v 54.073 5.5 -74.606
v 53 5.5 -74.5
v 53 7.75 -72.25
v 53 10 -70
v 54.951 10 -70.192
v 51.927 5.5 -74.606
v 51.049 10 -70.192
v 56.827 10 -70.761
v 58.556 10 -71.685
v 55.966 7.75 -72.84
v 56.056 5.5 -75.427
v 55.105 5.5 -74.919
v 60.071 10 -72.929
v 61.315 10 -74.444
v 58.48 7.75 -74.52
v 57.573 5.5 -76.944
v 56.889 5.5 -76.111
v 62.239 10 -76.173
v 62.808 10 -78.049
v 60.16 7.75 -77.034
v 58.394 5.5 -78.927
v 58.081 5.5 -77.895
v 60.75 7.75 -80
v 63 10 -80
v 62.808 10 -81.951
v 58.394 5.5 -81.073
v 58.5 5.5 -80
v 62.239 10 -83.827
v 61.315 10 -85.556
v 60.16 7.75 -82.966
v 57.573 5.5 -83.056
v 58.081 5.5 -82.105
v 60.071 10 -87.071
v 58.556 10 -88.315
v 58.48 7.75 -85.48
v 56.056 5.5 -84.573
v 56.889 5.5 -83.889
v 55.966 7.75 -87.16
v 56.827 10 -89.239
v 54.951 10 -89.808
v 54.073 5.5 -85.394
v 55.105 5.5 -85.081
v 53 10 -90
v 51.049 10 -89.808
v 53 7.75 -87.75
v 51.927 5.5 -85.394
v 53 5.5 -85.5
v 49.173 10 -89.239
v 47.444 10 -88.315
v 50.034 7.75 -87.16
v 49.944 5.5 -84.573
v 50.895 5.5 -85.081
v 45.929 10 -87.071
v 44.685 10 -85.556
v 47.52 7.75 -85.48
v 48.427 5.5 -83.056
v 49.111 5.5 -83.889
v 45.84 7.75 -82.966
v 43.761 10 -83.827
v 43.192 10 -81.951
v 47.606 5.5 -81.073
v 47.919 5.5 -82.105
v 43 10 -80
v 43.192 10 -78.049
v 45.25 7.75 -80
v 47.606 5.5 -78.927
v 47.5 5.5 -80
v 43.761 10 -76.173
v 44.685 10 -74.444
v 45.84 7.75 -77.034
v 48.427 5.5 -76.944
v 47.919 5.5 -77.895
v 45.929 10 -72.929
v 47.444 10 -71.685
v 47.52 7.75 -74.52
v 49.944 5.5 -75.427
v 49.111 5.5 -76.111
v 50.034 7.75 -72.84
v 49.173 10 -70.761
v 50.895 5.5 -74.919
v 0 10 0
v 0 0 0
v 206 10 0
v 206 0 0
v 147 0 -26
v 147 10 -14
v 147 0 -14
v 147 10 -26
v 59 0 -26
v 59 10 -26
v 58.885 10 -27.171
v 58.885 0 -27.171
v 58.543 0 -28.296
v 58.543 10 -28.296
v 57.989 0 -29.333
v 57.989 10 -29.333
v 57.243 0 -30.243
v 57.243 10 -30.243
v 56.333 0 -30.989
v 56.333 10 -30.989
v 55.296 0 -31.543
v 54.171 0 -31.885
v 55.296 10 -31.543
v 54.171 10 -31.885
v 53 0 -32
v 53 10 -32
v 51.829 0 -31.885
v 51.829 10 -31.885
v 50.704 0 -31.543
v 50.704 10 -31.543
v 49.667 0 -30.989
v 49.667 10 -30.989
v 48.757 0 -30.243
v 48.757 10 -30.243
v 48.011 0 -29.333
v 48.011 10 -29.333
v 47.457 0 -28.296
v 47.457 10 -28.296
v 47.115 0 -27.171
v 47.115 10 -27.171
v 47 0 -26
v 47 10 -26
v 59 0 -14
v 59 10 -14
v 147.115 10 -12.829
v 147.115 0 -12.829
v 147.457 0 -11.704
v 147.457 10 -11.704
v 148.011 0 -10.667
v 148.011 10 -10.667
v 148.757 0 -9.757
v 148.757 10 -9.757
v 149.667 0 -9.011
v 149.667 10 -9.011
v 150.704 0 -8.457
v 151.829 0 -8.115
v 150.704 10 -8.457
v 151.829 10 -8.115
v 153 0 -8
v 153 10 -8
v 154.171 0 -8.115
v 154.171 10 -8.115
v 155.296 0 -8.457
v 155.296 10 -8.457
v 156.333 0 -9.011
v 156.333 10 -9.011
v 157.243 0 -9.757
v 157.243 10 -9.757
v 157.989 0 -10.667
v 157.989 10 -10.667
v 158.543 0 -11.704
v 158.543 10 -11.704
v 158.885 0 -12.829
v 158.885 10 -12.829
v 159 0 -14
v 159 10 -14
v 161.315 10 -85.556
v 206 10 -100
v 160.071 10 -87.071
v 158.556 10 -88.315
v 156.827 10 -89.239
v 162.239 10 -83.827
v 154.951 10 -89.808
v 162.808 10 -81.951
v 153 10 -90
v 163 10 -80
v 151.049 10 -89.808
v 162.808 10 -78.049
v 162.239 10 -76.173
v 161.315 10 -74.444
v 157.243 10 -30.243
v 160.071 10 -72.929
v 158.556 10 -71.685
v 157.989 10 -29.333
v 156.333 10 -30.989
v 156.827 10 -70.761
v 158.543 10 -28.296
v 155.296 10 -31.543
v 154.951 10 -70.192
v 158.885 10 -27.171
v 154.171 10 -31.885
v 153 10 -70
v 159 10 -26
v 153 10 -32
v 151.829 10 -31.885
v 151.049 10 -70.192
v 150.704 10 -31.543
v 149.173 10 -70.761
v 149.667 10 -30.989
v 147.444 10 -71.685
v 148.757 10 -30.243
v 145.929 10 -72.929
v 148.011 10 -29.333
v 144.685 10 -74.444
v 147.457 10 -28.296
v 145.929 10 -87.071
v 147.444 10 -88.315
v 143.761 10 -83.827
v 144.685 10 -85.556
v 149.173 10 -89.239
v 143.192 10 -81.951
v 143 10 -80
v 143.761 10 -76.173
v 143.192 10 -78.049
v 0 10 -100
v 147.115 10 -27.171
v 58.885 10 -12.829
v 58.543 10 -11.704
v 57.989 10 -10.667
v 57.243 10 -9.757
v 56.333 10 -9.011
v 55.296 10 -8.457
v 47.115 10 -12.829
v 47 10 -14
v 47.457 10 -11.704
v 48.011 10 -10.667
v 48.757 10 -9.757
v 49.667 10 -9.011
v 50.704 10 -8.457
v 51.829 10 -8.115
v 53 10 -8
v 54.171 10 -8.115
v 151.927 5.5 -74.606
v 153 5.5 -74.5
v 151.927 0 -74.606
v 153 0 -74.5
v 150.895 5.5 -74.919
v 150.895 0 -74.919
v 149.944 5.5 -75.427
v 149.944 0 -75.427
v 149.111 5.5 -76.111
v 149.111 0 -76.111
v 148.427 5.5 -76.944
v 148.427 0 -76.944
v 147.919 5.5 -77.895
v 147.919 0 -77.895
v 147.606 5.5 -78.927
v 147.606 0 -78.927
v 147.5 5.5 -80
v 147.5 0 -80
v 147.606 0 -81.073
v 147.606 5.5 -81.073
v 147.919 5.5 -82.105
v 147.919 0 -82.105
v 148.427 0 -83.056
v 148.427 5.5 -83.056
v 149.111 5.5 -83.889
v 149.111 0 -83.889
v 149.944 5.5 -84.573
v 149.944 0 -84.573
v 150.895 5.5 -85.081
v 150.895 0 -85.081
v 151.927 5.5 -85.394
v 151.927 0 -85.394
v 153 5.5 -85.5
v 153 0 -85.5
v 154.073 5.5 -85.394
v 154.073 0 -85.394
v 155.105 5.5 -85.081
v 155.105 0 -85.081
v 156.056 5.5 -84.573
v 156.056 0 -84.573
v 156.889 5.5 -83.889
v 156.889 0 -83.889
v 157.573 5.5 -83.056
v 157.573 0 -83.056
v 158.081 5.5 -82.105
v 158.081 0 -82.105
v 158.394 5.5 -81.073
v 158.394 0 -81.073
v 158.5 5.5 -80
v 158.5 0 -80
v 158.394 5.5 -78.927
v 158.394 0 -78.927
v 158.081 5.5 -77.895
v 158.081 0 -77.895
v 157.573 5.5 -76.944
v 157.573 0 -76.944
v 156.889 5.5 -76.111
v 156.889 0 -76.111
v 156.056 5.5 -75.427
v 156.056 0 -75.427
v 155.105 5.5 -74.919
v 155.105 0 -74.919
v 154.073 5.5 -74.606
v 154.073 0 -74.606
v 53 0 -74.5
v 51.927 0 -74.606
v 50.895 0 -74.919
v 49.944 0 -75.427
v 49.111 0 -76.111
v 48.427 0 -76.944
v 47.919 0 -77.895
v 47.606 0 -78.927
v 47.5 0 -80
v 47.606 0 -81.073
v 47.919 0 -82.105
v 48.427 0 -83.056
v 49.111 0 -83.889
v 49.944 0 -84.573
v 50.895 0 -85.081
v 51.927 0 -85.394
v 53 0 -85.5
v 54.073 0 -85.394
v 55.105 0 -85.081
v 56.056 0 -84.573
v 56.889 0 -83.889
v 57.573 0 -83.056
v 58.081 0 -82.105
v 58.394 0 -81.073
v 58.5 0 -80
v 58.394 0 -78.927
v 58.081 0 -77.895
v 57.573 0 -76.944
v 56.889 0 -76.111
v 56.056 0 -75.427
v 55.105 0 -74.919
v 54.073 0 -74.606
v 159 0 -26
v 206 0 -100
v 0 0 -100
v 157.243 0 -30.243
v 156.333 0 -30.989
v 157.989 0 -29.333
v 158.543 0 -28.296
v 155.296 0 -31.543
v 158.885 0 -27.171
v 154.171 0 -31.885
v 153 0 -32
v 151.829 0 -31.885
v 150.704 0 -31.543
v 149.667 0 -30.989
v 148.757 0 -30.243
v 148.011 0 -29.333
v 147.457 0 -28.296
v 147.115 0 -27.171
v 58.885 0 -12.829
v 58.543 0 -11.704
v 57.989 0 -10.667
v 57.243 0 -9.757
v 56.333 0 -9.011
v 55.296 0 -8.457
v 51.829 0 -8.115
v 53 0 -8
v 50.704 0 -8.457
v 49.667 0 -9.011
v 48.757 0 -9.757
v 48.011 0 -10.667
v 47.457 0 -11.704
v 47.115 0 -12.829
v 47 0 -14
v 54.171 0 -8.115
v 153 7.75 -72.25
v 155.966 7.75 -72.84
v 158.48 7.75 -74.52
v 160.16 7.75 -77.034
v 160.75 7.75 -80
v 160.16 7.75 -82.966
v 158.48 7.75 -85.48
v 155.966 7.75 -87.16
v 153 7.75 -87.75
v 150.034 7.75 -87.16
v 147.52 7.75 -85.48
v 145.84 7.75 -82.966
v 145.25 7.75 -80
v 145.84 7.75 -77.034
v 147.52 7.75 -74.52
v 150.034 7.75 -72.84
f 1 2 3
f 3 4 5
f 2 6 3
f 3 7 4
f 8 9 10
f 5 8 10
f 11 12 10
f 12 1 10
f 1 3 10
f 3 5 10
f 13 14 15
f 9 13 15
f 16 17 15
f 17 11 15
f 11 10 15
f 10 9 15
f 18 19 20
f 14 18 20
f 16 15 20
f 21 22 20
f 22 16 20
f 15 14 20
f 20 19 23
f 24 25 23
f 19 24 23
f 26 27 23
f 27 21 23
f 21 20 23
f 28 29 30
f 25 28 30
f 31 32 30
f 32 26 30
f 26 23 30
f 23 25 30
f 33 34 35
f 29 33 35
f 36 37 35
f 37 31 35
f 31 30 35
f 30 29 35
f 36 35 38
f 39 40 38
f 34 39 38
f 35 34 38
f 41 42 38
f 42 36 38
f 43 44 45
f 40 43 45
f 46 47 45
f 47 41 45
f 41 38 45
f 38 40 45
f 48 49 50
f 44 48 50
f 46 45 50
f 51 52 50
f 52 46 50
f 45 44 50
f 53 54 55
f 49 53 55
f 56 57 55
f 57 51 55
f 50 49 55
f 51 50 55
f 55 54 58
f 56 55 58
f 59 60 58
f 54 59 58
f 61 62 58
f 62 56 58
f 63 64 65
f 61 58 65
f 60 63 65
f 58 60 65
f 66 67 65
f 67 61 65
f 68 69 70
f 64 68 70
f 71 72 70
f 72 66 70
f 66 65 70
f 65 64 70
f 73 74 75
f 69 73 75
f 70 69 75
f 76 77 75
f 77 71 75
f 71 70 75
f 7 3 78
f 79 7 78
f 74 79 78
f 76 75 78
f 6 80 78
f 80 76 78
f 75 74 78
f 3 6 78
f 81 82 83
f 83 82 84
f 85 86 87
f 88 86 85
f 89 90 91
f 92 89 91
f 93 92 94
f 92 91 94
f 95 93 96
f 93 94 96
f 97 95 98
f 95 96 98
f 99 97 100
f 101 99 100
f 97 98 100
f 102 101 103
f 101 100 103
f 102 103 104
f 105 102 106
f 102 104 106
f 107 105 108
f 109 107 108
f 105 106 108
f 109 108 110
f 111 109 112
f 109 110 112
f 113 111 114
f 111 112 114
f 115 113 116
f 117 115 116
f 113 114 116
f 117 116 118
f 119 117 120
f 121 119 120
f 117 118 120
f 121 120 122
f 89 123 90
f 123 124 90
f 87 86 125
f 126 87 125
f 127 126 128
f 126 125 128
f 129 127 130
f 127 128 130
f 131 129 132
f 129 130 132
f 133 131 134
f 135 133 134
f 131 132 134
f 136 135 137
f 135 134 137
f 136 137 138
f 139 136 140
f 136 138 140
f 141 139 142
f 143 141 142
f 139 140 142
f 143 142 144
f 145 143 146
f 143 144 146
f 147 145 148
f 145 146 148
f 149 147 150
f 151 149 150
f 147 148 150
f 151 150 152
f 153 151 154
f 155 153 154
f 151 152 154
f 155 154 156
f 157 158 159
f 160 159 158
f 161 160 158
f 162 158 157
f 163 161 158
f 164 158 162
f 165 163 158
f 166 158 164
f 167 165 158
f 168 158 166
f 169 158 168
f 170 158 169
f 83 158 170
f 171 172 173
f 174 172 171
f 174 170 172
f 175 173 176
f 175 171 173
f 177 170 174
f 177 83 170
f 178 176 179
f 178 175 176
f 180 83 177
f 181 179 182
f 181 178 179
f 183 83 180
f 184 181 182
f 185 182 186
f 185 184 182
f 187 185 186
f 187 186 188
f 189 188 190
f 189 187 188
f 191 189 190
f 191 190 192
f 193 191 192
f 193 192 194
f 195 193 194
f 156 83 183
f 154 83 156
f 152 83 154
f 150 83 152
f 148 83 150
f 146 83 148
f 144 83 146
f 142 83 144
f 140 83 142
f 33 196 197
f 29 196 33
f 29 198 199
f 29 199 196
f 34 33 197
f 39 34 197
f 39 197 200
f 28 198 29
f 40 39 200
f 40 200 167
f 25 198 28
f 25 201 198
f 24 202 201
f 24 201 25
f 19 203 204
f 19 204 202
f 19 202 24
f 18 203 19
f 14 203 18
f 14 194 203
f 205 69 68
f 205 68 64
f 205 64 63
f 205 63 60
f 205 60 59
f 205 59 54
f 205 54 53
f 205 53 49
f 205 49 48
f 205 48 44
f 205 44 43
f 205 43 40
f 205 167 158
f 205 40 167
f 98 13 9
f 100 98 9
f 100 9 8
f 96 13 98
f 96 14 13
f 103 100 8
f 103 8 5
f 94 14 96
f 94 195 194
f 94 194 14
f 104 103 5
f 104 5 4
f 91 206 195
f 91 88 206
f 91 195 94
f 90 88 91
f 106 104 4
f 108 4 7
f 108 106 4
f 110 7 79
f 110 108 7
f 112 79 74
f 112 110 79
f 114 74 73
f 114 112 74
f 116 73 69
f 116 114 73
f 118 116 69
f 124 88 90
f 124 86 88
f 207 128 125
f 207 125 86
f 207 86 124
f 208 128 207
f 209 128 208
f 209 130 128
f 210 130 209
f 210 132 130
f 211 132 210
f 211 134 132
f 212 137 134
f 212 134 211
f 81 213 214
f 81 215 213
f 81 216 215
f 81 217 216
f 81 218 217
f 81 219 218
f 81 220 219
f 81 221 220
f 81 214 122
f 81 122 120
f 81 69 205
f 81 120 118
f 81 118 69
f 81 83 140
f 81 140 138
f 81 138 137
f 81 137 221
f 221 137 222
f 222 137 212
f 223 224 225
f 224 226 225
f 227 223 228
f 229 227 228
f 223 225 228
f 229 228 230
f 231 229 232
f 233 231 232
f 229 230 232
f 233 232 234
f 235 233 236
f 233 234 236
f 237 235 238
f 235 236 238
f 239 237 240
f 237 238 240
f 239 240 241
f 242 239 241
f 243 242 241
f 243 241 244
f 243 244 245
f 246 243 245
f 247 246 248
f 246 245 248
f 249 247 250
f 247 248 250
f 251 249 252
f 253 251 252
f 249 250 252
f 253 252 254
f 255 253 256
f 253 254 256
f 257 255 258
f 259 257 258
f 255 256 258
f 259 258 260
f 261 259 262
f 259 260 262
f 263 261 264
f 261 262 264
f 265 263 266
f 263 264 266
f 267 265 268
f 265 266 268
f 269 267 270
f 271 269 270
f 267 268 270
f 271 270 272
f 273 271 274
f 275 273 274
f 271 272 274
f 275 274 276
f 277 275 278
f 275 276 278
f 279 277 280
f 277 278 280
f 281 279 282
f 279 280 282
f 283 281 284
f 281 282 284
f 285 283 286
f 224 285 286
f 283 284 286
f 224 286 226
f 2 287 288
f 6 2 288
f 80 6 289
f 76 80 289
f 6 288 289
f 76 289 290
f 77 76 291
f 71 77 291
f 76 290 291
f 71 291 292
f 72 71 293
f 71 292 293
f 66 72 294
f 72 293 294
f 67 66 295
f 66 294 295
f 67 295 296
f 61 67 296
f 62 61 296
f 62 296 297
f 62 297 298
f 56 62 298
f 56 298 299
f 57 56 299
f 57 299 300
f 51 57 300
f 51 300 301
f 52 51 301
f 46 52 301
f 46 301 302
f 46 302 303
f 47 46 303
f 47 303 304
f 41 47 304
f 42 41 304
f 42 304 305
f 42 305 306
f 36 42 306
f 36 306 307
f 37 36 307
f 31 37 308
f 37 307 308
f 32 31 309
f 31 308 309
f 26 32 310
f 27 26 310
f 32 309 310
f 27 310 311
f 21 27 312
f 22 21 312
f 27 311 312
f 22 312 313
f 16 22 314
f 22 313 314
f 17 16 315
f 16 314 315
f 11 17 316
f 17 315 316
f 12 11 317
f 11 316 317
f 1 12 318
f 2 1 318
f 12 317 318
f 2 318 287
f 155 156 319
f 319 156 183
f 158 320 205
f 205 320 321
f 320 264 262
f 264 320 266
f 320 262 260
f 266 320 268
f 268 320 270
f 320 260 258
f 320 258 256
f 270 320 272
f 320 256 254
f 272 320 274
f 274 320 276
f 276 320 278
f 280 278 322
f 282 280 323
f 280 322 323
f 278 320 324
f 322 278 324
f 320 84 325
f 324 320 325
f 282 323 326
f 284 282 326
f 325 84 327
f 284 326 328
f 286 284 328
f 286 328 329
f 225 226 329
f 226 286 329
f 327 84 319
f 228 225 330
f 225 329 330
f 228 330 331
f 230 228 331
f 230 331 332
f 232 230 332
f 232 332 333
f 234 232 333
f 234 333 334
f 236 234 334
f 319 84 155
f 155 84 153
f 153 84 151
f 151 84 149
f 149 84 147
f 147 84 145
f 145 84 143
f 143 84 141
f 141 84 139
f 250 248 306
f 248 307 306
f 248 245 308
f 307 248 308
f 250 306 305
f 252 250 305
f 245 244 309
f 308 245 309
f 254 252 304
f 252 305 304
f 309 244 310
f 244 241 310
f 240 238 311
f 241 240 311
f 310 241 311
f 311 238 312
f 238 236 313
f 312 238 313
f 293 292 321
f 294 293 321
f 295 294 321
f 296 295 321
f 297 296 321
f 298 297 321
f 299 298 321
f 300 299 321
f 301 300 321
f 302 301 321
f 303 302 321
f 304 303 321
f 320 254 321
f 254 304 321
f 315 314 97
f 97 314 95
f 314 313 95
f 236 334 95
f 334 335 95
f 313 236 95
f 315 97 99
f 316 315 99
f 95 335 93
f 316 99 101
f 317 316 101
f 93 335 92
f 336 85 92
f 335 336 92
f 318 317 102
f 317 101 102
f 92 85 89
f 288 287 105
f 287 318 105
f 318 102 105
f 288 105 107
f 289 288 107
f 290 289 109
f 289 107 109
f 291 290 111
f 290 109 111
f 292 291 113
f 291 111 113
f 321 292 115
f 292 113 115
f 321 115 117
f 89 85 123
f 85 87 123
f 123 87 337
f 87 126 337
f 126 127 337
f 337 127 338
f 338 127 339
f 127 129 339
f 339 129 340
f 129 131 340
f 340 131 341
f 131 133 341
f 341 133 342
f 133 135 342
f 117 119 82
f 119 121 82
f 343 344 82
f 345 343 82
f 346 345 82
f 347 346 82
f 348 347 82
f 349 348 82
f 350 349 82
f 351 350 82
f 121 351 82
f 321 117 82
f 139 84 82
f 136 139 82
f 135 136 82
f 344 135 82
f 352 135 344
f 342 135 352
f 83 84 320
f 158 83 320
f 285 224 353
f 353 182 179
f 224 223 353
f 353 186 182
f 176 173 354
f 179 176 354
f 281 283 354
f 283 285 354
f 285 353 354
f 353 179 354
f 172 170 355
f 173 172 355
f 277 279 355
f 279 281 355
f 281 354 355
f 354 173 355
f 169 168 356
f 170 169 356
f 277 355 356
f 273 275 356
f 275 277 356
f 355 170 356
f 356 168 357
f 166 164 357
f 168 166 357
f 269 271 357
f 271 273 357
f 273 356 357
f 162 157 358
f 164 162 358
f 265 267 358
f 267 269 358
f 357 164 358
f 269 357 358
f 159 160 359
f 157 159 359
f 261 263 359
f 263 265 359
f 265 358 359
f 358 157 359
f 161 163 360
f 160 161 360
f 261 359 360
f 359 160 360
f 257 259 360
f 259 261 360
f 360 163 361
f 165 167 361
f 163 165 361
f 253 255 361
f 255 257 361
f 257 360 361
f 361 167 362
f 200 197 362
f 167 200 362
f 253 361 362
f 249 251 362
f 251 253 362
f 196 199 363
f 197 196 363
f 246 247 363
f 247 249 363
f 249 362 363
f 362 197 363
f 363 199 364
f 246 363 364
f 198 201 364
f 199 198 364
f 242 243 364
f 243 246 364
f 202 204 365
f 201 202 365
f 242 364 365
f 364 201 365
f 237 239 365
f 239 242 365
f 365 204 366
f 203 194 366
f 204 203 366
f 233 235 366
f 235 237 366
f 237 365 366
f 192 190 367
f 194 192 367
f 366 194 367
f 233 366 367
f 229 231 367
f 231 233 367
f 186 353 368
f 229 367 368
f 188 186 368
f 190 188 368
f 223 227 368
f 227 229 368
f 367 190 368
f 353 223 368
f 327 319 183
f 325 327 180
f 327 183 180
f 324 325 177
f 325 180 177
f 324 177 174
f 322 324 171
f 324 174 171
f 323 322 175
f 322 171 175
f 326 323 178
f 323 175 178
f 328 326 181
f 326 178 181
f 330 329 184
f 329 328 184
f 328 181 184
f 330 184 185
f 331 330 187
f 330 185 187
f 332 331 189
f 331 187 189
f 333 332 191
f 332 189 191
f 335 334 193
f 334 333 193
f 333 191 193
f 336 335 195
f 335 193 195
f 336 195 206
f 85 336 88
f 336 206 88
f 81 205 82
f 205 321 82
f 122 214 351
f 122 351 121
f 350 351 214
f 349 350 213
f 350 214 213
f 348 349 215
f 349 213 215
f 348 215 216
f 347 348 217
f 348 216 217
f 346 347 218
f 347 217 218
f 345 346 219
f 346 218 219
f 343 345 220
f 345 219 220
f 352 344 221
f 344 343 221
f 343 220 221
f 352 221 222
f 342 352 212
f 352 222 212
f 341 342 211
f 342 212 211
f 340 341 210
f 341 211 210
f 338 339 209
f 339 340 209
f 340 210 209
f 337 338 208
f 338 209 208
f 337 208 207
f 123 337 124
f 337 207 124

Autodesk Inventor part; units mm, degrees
ref_plane "YZ Plane" through (0, 0, 0) normal (1, 0, 0) x (0, 1, 0)
ref_plane "XZ Plane" through (0, 0, 0) normal (0, 1, 0) x (-1, 0, 0)
ref_plane "XY Plane" through (0, 0, 0) normal (0, 0, 1) x (1, 0, 0)
sketch "Skizze1" plane through (0, 0, 0) normal (0, 1, 0) x (-1, 0, 0)
  line L0 (0, 0) -> (-206, 0)
  line L1 (-206, 0) -> (-206, -100)
  line L2 (-206, -100) -> (0, -100)
  line L3 (0, -100) -> (0, 0)
  dimension "d0" = 206
  dimension "d1" = 100
extrude "Extrusion1" add sketch "Skizze1" along normal blind 10
sketch "Skizze2" plane through (0, 10, 0) normal (0, 1, 0) x (1, 0, 0)
  line L0 (206, 100) -> (0, 100) construction
  line L1 (0, 100) -> (0, 20) construction
  line L2 (0, 100) -> (0, 0) construction
  line L3 (0, 100) -> (80, 100) construction
  line L4 (0, 20) -> (206, 20) construction
  line L5 (206, 20) -> (103, 20) construction
  line L6 (206, 20) -> (309, 20) construction
  line L7 (103, 20) -> (153, 20) construction
  line L8 (103, 20) -> (153, 20) construction
  line L9 (153, 20) -> (147, 20)
  line L10 (147, 20) -> (147, 26)
  line L11 (147, 26) -> (153, 26)
  line L12 (153, 26) -> (153, 20)
  line L13 (147, 20) -> (153, 20)
  line L14 (153, 20) -> (153, 14)
  line L15 (153, 14) -> (147, 14)
  line L16 (147, 14) -> (147, 20)
  arc A0 (147, 14) -> (153, 8) centre (153, 14) ccw
  arc A1 (153, 32) -> (147, 26) centre (153, 26) ccw
  line L17 (153, 8) -> (153, 32)
  line L18 (306, 20) -> (100, 20) construction
  line L19 (100, 20) -> (203, 20) construction
  line L20 (203, 20) -> (153, 20) construction
  line L21 (203, 20) -> (153, 20) construction
  line L22 (153, 20) -> (159, 20)
  line L23 (159, 20) -> (159, 26)
  line L24 (159, 26) -> (153, 26)
  line L25 (159, 20) -> (153, 20)
  line L26 (153, 14) -> (159, 14)
  line L27 (159, 14) -> (159, 20)
  arc A2 (153, 8) -> (159, 14) centre (153, 14) ccw
  arc A3 (159, 26) -> (153, 32) centre (153, 26) ccw
  line L28 (103, 100) -> (103, 20) construction
  line L29 (0, 0) -> (206, 0) construction
  line L30 (103, 100) -> (183, 100) construction
  line L31 (53, 20) -> (59, 20)
  line L32 (59, 20) -> (59, 26)
  line L33 (59, 26) -> (53, 26)
  line L34 (53, 26) -> (53, 20)
  line L35 (59, 20) -> (53, 20)
  line L36 (53, 20) -> (53, 14)
  line L37 (53, 14) -> (59, 14)
  line L38 (59, 14) -> (59, 20)
  arc A4 (53, 8) -> (59, 14) centre (53, 14) ccw
  arc A5 (59, 26) -> (53, 32) centre (53, 26) ccw
  line L39 (53, 8) -> (53, 32)
  line L40 (47, 20) -> (47, 26)
  line L41 (47, 26) -> (53, 26)
  line L42 (53, 20) -> (47, 20)
  line L43 (47, 20) -> (53, 20)
  line L44 (47, 14) -> (47, 20)
  line L45 (53, 14) -> (47, 14)
  arc A6 (53, 32) -> (47, 26) centre (53, 26) ccw
  arc A7 (47, 14) -> (53, 8) centre (53, 14) ccw
  dimension "d4" = 80
  dimension "d5" = 90
  dimension "d6" = 206
  dimension "d7" = 90
  dimension "d8" = 103
  dimension "d9" = 180
  dimension "d10" = 50
  dimension "d11" = 0
  dimension "d12" = 6
  dimension "d13" = 6
  dimension "d14" = 6
  dimension "d15" = 6
  dimension "d16" = 80
  dimension "d17" = 90
extrude "Extrusion2" cut sketch "Skizze2" against normal blind 10
sketch "Skizze4" plane through (0, 10, 0) normal (0, 1, 0) x (1, 0, 0)
  line L0 (0, 100) -> (0, 80) construction
  line L1 (0, 100) -> (0, 0) construction
  line L2 (0, 100) -> (20, 100) construction
  line L3 (0, 80) -> (206, 80) construction
  line L4 (0, 80) -> (103, 80) construction
  line L5 (103, 80) -> (53, 80) construction
  line L6 (53, 80) -> (153, 80) construction
  dimension "d24" = 20
  dimension "d25" = 90
  dimension "d26" = 206
  dimension "d27" = 90
  dimension "d28" = 50
  dimension "d29" = 100
  dimension "d30" = 0
hole "Bohrung1" at (153, 10, -80) at (53, 10, -80) direction (0, -1, 0) diameter 11 end through all countersink diameter 20 countersink angle 90 clearance for "Flachkopfsenkschraube DIN EN ISO 2009" size "M10" standard "DIN"
properties part number "Motorhalterung_BT1"
